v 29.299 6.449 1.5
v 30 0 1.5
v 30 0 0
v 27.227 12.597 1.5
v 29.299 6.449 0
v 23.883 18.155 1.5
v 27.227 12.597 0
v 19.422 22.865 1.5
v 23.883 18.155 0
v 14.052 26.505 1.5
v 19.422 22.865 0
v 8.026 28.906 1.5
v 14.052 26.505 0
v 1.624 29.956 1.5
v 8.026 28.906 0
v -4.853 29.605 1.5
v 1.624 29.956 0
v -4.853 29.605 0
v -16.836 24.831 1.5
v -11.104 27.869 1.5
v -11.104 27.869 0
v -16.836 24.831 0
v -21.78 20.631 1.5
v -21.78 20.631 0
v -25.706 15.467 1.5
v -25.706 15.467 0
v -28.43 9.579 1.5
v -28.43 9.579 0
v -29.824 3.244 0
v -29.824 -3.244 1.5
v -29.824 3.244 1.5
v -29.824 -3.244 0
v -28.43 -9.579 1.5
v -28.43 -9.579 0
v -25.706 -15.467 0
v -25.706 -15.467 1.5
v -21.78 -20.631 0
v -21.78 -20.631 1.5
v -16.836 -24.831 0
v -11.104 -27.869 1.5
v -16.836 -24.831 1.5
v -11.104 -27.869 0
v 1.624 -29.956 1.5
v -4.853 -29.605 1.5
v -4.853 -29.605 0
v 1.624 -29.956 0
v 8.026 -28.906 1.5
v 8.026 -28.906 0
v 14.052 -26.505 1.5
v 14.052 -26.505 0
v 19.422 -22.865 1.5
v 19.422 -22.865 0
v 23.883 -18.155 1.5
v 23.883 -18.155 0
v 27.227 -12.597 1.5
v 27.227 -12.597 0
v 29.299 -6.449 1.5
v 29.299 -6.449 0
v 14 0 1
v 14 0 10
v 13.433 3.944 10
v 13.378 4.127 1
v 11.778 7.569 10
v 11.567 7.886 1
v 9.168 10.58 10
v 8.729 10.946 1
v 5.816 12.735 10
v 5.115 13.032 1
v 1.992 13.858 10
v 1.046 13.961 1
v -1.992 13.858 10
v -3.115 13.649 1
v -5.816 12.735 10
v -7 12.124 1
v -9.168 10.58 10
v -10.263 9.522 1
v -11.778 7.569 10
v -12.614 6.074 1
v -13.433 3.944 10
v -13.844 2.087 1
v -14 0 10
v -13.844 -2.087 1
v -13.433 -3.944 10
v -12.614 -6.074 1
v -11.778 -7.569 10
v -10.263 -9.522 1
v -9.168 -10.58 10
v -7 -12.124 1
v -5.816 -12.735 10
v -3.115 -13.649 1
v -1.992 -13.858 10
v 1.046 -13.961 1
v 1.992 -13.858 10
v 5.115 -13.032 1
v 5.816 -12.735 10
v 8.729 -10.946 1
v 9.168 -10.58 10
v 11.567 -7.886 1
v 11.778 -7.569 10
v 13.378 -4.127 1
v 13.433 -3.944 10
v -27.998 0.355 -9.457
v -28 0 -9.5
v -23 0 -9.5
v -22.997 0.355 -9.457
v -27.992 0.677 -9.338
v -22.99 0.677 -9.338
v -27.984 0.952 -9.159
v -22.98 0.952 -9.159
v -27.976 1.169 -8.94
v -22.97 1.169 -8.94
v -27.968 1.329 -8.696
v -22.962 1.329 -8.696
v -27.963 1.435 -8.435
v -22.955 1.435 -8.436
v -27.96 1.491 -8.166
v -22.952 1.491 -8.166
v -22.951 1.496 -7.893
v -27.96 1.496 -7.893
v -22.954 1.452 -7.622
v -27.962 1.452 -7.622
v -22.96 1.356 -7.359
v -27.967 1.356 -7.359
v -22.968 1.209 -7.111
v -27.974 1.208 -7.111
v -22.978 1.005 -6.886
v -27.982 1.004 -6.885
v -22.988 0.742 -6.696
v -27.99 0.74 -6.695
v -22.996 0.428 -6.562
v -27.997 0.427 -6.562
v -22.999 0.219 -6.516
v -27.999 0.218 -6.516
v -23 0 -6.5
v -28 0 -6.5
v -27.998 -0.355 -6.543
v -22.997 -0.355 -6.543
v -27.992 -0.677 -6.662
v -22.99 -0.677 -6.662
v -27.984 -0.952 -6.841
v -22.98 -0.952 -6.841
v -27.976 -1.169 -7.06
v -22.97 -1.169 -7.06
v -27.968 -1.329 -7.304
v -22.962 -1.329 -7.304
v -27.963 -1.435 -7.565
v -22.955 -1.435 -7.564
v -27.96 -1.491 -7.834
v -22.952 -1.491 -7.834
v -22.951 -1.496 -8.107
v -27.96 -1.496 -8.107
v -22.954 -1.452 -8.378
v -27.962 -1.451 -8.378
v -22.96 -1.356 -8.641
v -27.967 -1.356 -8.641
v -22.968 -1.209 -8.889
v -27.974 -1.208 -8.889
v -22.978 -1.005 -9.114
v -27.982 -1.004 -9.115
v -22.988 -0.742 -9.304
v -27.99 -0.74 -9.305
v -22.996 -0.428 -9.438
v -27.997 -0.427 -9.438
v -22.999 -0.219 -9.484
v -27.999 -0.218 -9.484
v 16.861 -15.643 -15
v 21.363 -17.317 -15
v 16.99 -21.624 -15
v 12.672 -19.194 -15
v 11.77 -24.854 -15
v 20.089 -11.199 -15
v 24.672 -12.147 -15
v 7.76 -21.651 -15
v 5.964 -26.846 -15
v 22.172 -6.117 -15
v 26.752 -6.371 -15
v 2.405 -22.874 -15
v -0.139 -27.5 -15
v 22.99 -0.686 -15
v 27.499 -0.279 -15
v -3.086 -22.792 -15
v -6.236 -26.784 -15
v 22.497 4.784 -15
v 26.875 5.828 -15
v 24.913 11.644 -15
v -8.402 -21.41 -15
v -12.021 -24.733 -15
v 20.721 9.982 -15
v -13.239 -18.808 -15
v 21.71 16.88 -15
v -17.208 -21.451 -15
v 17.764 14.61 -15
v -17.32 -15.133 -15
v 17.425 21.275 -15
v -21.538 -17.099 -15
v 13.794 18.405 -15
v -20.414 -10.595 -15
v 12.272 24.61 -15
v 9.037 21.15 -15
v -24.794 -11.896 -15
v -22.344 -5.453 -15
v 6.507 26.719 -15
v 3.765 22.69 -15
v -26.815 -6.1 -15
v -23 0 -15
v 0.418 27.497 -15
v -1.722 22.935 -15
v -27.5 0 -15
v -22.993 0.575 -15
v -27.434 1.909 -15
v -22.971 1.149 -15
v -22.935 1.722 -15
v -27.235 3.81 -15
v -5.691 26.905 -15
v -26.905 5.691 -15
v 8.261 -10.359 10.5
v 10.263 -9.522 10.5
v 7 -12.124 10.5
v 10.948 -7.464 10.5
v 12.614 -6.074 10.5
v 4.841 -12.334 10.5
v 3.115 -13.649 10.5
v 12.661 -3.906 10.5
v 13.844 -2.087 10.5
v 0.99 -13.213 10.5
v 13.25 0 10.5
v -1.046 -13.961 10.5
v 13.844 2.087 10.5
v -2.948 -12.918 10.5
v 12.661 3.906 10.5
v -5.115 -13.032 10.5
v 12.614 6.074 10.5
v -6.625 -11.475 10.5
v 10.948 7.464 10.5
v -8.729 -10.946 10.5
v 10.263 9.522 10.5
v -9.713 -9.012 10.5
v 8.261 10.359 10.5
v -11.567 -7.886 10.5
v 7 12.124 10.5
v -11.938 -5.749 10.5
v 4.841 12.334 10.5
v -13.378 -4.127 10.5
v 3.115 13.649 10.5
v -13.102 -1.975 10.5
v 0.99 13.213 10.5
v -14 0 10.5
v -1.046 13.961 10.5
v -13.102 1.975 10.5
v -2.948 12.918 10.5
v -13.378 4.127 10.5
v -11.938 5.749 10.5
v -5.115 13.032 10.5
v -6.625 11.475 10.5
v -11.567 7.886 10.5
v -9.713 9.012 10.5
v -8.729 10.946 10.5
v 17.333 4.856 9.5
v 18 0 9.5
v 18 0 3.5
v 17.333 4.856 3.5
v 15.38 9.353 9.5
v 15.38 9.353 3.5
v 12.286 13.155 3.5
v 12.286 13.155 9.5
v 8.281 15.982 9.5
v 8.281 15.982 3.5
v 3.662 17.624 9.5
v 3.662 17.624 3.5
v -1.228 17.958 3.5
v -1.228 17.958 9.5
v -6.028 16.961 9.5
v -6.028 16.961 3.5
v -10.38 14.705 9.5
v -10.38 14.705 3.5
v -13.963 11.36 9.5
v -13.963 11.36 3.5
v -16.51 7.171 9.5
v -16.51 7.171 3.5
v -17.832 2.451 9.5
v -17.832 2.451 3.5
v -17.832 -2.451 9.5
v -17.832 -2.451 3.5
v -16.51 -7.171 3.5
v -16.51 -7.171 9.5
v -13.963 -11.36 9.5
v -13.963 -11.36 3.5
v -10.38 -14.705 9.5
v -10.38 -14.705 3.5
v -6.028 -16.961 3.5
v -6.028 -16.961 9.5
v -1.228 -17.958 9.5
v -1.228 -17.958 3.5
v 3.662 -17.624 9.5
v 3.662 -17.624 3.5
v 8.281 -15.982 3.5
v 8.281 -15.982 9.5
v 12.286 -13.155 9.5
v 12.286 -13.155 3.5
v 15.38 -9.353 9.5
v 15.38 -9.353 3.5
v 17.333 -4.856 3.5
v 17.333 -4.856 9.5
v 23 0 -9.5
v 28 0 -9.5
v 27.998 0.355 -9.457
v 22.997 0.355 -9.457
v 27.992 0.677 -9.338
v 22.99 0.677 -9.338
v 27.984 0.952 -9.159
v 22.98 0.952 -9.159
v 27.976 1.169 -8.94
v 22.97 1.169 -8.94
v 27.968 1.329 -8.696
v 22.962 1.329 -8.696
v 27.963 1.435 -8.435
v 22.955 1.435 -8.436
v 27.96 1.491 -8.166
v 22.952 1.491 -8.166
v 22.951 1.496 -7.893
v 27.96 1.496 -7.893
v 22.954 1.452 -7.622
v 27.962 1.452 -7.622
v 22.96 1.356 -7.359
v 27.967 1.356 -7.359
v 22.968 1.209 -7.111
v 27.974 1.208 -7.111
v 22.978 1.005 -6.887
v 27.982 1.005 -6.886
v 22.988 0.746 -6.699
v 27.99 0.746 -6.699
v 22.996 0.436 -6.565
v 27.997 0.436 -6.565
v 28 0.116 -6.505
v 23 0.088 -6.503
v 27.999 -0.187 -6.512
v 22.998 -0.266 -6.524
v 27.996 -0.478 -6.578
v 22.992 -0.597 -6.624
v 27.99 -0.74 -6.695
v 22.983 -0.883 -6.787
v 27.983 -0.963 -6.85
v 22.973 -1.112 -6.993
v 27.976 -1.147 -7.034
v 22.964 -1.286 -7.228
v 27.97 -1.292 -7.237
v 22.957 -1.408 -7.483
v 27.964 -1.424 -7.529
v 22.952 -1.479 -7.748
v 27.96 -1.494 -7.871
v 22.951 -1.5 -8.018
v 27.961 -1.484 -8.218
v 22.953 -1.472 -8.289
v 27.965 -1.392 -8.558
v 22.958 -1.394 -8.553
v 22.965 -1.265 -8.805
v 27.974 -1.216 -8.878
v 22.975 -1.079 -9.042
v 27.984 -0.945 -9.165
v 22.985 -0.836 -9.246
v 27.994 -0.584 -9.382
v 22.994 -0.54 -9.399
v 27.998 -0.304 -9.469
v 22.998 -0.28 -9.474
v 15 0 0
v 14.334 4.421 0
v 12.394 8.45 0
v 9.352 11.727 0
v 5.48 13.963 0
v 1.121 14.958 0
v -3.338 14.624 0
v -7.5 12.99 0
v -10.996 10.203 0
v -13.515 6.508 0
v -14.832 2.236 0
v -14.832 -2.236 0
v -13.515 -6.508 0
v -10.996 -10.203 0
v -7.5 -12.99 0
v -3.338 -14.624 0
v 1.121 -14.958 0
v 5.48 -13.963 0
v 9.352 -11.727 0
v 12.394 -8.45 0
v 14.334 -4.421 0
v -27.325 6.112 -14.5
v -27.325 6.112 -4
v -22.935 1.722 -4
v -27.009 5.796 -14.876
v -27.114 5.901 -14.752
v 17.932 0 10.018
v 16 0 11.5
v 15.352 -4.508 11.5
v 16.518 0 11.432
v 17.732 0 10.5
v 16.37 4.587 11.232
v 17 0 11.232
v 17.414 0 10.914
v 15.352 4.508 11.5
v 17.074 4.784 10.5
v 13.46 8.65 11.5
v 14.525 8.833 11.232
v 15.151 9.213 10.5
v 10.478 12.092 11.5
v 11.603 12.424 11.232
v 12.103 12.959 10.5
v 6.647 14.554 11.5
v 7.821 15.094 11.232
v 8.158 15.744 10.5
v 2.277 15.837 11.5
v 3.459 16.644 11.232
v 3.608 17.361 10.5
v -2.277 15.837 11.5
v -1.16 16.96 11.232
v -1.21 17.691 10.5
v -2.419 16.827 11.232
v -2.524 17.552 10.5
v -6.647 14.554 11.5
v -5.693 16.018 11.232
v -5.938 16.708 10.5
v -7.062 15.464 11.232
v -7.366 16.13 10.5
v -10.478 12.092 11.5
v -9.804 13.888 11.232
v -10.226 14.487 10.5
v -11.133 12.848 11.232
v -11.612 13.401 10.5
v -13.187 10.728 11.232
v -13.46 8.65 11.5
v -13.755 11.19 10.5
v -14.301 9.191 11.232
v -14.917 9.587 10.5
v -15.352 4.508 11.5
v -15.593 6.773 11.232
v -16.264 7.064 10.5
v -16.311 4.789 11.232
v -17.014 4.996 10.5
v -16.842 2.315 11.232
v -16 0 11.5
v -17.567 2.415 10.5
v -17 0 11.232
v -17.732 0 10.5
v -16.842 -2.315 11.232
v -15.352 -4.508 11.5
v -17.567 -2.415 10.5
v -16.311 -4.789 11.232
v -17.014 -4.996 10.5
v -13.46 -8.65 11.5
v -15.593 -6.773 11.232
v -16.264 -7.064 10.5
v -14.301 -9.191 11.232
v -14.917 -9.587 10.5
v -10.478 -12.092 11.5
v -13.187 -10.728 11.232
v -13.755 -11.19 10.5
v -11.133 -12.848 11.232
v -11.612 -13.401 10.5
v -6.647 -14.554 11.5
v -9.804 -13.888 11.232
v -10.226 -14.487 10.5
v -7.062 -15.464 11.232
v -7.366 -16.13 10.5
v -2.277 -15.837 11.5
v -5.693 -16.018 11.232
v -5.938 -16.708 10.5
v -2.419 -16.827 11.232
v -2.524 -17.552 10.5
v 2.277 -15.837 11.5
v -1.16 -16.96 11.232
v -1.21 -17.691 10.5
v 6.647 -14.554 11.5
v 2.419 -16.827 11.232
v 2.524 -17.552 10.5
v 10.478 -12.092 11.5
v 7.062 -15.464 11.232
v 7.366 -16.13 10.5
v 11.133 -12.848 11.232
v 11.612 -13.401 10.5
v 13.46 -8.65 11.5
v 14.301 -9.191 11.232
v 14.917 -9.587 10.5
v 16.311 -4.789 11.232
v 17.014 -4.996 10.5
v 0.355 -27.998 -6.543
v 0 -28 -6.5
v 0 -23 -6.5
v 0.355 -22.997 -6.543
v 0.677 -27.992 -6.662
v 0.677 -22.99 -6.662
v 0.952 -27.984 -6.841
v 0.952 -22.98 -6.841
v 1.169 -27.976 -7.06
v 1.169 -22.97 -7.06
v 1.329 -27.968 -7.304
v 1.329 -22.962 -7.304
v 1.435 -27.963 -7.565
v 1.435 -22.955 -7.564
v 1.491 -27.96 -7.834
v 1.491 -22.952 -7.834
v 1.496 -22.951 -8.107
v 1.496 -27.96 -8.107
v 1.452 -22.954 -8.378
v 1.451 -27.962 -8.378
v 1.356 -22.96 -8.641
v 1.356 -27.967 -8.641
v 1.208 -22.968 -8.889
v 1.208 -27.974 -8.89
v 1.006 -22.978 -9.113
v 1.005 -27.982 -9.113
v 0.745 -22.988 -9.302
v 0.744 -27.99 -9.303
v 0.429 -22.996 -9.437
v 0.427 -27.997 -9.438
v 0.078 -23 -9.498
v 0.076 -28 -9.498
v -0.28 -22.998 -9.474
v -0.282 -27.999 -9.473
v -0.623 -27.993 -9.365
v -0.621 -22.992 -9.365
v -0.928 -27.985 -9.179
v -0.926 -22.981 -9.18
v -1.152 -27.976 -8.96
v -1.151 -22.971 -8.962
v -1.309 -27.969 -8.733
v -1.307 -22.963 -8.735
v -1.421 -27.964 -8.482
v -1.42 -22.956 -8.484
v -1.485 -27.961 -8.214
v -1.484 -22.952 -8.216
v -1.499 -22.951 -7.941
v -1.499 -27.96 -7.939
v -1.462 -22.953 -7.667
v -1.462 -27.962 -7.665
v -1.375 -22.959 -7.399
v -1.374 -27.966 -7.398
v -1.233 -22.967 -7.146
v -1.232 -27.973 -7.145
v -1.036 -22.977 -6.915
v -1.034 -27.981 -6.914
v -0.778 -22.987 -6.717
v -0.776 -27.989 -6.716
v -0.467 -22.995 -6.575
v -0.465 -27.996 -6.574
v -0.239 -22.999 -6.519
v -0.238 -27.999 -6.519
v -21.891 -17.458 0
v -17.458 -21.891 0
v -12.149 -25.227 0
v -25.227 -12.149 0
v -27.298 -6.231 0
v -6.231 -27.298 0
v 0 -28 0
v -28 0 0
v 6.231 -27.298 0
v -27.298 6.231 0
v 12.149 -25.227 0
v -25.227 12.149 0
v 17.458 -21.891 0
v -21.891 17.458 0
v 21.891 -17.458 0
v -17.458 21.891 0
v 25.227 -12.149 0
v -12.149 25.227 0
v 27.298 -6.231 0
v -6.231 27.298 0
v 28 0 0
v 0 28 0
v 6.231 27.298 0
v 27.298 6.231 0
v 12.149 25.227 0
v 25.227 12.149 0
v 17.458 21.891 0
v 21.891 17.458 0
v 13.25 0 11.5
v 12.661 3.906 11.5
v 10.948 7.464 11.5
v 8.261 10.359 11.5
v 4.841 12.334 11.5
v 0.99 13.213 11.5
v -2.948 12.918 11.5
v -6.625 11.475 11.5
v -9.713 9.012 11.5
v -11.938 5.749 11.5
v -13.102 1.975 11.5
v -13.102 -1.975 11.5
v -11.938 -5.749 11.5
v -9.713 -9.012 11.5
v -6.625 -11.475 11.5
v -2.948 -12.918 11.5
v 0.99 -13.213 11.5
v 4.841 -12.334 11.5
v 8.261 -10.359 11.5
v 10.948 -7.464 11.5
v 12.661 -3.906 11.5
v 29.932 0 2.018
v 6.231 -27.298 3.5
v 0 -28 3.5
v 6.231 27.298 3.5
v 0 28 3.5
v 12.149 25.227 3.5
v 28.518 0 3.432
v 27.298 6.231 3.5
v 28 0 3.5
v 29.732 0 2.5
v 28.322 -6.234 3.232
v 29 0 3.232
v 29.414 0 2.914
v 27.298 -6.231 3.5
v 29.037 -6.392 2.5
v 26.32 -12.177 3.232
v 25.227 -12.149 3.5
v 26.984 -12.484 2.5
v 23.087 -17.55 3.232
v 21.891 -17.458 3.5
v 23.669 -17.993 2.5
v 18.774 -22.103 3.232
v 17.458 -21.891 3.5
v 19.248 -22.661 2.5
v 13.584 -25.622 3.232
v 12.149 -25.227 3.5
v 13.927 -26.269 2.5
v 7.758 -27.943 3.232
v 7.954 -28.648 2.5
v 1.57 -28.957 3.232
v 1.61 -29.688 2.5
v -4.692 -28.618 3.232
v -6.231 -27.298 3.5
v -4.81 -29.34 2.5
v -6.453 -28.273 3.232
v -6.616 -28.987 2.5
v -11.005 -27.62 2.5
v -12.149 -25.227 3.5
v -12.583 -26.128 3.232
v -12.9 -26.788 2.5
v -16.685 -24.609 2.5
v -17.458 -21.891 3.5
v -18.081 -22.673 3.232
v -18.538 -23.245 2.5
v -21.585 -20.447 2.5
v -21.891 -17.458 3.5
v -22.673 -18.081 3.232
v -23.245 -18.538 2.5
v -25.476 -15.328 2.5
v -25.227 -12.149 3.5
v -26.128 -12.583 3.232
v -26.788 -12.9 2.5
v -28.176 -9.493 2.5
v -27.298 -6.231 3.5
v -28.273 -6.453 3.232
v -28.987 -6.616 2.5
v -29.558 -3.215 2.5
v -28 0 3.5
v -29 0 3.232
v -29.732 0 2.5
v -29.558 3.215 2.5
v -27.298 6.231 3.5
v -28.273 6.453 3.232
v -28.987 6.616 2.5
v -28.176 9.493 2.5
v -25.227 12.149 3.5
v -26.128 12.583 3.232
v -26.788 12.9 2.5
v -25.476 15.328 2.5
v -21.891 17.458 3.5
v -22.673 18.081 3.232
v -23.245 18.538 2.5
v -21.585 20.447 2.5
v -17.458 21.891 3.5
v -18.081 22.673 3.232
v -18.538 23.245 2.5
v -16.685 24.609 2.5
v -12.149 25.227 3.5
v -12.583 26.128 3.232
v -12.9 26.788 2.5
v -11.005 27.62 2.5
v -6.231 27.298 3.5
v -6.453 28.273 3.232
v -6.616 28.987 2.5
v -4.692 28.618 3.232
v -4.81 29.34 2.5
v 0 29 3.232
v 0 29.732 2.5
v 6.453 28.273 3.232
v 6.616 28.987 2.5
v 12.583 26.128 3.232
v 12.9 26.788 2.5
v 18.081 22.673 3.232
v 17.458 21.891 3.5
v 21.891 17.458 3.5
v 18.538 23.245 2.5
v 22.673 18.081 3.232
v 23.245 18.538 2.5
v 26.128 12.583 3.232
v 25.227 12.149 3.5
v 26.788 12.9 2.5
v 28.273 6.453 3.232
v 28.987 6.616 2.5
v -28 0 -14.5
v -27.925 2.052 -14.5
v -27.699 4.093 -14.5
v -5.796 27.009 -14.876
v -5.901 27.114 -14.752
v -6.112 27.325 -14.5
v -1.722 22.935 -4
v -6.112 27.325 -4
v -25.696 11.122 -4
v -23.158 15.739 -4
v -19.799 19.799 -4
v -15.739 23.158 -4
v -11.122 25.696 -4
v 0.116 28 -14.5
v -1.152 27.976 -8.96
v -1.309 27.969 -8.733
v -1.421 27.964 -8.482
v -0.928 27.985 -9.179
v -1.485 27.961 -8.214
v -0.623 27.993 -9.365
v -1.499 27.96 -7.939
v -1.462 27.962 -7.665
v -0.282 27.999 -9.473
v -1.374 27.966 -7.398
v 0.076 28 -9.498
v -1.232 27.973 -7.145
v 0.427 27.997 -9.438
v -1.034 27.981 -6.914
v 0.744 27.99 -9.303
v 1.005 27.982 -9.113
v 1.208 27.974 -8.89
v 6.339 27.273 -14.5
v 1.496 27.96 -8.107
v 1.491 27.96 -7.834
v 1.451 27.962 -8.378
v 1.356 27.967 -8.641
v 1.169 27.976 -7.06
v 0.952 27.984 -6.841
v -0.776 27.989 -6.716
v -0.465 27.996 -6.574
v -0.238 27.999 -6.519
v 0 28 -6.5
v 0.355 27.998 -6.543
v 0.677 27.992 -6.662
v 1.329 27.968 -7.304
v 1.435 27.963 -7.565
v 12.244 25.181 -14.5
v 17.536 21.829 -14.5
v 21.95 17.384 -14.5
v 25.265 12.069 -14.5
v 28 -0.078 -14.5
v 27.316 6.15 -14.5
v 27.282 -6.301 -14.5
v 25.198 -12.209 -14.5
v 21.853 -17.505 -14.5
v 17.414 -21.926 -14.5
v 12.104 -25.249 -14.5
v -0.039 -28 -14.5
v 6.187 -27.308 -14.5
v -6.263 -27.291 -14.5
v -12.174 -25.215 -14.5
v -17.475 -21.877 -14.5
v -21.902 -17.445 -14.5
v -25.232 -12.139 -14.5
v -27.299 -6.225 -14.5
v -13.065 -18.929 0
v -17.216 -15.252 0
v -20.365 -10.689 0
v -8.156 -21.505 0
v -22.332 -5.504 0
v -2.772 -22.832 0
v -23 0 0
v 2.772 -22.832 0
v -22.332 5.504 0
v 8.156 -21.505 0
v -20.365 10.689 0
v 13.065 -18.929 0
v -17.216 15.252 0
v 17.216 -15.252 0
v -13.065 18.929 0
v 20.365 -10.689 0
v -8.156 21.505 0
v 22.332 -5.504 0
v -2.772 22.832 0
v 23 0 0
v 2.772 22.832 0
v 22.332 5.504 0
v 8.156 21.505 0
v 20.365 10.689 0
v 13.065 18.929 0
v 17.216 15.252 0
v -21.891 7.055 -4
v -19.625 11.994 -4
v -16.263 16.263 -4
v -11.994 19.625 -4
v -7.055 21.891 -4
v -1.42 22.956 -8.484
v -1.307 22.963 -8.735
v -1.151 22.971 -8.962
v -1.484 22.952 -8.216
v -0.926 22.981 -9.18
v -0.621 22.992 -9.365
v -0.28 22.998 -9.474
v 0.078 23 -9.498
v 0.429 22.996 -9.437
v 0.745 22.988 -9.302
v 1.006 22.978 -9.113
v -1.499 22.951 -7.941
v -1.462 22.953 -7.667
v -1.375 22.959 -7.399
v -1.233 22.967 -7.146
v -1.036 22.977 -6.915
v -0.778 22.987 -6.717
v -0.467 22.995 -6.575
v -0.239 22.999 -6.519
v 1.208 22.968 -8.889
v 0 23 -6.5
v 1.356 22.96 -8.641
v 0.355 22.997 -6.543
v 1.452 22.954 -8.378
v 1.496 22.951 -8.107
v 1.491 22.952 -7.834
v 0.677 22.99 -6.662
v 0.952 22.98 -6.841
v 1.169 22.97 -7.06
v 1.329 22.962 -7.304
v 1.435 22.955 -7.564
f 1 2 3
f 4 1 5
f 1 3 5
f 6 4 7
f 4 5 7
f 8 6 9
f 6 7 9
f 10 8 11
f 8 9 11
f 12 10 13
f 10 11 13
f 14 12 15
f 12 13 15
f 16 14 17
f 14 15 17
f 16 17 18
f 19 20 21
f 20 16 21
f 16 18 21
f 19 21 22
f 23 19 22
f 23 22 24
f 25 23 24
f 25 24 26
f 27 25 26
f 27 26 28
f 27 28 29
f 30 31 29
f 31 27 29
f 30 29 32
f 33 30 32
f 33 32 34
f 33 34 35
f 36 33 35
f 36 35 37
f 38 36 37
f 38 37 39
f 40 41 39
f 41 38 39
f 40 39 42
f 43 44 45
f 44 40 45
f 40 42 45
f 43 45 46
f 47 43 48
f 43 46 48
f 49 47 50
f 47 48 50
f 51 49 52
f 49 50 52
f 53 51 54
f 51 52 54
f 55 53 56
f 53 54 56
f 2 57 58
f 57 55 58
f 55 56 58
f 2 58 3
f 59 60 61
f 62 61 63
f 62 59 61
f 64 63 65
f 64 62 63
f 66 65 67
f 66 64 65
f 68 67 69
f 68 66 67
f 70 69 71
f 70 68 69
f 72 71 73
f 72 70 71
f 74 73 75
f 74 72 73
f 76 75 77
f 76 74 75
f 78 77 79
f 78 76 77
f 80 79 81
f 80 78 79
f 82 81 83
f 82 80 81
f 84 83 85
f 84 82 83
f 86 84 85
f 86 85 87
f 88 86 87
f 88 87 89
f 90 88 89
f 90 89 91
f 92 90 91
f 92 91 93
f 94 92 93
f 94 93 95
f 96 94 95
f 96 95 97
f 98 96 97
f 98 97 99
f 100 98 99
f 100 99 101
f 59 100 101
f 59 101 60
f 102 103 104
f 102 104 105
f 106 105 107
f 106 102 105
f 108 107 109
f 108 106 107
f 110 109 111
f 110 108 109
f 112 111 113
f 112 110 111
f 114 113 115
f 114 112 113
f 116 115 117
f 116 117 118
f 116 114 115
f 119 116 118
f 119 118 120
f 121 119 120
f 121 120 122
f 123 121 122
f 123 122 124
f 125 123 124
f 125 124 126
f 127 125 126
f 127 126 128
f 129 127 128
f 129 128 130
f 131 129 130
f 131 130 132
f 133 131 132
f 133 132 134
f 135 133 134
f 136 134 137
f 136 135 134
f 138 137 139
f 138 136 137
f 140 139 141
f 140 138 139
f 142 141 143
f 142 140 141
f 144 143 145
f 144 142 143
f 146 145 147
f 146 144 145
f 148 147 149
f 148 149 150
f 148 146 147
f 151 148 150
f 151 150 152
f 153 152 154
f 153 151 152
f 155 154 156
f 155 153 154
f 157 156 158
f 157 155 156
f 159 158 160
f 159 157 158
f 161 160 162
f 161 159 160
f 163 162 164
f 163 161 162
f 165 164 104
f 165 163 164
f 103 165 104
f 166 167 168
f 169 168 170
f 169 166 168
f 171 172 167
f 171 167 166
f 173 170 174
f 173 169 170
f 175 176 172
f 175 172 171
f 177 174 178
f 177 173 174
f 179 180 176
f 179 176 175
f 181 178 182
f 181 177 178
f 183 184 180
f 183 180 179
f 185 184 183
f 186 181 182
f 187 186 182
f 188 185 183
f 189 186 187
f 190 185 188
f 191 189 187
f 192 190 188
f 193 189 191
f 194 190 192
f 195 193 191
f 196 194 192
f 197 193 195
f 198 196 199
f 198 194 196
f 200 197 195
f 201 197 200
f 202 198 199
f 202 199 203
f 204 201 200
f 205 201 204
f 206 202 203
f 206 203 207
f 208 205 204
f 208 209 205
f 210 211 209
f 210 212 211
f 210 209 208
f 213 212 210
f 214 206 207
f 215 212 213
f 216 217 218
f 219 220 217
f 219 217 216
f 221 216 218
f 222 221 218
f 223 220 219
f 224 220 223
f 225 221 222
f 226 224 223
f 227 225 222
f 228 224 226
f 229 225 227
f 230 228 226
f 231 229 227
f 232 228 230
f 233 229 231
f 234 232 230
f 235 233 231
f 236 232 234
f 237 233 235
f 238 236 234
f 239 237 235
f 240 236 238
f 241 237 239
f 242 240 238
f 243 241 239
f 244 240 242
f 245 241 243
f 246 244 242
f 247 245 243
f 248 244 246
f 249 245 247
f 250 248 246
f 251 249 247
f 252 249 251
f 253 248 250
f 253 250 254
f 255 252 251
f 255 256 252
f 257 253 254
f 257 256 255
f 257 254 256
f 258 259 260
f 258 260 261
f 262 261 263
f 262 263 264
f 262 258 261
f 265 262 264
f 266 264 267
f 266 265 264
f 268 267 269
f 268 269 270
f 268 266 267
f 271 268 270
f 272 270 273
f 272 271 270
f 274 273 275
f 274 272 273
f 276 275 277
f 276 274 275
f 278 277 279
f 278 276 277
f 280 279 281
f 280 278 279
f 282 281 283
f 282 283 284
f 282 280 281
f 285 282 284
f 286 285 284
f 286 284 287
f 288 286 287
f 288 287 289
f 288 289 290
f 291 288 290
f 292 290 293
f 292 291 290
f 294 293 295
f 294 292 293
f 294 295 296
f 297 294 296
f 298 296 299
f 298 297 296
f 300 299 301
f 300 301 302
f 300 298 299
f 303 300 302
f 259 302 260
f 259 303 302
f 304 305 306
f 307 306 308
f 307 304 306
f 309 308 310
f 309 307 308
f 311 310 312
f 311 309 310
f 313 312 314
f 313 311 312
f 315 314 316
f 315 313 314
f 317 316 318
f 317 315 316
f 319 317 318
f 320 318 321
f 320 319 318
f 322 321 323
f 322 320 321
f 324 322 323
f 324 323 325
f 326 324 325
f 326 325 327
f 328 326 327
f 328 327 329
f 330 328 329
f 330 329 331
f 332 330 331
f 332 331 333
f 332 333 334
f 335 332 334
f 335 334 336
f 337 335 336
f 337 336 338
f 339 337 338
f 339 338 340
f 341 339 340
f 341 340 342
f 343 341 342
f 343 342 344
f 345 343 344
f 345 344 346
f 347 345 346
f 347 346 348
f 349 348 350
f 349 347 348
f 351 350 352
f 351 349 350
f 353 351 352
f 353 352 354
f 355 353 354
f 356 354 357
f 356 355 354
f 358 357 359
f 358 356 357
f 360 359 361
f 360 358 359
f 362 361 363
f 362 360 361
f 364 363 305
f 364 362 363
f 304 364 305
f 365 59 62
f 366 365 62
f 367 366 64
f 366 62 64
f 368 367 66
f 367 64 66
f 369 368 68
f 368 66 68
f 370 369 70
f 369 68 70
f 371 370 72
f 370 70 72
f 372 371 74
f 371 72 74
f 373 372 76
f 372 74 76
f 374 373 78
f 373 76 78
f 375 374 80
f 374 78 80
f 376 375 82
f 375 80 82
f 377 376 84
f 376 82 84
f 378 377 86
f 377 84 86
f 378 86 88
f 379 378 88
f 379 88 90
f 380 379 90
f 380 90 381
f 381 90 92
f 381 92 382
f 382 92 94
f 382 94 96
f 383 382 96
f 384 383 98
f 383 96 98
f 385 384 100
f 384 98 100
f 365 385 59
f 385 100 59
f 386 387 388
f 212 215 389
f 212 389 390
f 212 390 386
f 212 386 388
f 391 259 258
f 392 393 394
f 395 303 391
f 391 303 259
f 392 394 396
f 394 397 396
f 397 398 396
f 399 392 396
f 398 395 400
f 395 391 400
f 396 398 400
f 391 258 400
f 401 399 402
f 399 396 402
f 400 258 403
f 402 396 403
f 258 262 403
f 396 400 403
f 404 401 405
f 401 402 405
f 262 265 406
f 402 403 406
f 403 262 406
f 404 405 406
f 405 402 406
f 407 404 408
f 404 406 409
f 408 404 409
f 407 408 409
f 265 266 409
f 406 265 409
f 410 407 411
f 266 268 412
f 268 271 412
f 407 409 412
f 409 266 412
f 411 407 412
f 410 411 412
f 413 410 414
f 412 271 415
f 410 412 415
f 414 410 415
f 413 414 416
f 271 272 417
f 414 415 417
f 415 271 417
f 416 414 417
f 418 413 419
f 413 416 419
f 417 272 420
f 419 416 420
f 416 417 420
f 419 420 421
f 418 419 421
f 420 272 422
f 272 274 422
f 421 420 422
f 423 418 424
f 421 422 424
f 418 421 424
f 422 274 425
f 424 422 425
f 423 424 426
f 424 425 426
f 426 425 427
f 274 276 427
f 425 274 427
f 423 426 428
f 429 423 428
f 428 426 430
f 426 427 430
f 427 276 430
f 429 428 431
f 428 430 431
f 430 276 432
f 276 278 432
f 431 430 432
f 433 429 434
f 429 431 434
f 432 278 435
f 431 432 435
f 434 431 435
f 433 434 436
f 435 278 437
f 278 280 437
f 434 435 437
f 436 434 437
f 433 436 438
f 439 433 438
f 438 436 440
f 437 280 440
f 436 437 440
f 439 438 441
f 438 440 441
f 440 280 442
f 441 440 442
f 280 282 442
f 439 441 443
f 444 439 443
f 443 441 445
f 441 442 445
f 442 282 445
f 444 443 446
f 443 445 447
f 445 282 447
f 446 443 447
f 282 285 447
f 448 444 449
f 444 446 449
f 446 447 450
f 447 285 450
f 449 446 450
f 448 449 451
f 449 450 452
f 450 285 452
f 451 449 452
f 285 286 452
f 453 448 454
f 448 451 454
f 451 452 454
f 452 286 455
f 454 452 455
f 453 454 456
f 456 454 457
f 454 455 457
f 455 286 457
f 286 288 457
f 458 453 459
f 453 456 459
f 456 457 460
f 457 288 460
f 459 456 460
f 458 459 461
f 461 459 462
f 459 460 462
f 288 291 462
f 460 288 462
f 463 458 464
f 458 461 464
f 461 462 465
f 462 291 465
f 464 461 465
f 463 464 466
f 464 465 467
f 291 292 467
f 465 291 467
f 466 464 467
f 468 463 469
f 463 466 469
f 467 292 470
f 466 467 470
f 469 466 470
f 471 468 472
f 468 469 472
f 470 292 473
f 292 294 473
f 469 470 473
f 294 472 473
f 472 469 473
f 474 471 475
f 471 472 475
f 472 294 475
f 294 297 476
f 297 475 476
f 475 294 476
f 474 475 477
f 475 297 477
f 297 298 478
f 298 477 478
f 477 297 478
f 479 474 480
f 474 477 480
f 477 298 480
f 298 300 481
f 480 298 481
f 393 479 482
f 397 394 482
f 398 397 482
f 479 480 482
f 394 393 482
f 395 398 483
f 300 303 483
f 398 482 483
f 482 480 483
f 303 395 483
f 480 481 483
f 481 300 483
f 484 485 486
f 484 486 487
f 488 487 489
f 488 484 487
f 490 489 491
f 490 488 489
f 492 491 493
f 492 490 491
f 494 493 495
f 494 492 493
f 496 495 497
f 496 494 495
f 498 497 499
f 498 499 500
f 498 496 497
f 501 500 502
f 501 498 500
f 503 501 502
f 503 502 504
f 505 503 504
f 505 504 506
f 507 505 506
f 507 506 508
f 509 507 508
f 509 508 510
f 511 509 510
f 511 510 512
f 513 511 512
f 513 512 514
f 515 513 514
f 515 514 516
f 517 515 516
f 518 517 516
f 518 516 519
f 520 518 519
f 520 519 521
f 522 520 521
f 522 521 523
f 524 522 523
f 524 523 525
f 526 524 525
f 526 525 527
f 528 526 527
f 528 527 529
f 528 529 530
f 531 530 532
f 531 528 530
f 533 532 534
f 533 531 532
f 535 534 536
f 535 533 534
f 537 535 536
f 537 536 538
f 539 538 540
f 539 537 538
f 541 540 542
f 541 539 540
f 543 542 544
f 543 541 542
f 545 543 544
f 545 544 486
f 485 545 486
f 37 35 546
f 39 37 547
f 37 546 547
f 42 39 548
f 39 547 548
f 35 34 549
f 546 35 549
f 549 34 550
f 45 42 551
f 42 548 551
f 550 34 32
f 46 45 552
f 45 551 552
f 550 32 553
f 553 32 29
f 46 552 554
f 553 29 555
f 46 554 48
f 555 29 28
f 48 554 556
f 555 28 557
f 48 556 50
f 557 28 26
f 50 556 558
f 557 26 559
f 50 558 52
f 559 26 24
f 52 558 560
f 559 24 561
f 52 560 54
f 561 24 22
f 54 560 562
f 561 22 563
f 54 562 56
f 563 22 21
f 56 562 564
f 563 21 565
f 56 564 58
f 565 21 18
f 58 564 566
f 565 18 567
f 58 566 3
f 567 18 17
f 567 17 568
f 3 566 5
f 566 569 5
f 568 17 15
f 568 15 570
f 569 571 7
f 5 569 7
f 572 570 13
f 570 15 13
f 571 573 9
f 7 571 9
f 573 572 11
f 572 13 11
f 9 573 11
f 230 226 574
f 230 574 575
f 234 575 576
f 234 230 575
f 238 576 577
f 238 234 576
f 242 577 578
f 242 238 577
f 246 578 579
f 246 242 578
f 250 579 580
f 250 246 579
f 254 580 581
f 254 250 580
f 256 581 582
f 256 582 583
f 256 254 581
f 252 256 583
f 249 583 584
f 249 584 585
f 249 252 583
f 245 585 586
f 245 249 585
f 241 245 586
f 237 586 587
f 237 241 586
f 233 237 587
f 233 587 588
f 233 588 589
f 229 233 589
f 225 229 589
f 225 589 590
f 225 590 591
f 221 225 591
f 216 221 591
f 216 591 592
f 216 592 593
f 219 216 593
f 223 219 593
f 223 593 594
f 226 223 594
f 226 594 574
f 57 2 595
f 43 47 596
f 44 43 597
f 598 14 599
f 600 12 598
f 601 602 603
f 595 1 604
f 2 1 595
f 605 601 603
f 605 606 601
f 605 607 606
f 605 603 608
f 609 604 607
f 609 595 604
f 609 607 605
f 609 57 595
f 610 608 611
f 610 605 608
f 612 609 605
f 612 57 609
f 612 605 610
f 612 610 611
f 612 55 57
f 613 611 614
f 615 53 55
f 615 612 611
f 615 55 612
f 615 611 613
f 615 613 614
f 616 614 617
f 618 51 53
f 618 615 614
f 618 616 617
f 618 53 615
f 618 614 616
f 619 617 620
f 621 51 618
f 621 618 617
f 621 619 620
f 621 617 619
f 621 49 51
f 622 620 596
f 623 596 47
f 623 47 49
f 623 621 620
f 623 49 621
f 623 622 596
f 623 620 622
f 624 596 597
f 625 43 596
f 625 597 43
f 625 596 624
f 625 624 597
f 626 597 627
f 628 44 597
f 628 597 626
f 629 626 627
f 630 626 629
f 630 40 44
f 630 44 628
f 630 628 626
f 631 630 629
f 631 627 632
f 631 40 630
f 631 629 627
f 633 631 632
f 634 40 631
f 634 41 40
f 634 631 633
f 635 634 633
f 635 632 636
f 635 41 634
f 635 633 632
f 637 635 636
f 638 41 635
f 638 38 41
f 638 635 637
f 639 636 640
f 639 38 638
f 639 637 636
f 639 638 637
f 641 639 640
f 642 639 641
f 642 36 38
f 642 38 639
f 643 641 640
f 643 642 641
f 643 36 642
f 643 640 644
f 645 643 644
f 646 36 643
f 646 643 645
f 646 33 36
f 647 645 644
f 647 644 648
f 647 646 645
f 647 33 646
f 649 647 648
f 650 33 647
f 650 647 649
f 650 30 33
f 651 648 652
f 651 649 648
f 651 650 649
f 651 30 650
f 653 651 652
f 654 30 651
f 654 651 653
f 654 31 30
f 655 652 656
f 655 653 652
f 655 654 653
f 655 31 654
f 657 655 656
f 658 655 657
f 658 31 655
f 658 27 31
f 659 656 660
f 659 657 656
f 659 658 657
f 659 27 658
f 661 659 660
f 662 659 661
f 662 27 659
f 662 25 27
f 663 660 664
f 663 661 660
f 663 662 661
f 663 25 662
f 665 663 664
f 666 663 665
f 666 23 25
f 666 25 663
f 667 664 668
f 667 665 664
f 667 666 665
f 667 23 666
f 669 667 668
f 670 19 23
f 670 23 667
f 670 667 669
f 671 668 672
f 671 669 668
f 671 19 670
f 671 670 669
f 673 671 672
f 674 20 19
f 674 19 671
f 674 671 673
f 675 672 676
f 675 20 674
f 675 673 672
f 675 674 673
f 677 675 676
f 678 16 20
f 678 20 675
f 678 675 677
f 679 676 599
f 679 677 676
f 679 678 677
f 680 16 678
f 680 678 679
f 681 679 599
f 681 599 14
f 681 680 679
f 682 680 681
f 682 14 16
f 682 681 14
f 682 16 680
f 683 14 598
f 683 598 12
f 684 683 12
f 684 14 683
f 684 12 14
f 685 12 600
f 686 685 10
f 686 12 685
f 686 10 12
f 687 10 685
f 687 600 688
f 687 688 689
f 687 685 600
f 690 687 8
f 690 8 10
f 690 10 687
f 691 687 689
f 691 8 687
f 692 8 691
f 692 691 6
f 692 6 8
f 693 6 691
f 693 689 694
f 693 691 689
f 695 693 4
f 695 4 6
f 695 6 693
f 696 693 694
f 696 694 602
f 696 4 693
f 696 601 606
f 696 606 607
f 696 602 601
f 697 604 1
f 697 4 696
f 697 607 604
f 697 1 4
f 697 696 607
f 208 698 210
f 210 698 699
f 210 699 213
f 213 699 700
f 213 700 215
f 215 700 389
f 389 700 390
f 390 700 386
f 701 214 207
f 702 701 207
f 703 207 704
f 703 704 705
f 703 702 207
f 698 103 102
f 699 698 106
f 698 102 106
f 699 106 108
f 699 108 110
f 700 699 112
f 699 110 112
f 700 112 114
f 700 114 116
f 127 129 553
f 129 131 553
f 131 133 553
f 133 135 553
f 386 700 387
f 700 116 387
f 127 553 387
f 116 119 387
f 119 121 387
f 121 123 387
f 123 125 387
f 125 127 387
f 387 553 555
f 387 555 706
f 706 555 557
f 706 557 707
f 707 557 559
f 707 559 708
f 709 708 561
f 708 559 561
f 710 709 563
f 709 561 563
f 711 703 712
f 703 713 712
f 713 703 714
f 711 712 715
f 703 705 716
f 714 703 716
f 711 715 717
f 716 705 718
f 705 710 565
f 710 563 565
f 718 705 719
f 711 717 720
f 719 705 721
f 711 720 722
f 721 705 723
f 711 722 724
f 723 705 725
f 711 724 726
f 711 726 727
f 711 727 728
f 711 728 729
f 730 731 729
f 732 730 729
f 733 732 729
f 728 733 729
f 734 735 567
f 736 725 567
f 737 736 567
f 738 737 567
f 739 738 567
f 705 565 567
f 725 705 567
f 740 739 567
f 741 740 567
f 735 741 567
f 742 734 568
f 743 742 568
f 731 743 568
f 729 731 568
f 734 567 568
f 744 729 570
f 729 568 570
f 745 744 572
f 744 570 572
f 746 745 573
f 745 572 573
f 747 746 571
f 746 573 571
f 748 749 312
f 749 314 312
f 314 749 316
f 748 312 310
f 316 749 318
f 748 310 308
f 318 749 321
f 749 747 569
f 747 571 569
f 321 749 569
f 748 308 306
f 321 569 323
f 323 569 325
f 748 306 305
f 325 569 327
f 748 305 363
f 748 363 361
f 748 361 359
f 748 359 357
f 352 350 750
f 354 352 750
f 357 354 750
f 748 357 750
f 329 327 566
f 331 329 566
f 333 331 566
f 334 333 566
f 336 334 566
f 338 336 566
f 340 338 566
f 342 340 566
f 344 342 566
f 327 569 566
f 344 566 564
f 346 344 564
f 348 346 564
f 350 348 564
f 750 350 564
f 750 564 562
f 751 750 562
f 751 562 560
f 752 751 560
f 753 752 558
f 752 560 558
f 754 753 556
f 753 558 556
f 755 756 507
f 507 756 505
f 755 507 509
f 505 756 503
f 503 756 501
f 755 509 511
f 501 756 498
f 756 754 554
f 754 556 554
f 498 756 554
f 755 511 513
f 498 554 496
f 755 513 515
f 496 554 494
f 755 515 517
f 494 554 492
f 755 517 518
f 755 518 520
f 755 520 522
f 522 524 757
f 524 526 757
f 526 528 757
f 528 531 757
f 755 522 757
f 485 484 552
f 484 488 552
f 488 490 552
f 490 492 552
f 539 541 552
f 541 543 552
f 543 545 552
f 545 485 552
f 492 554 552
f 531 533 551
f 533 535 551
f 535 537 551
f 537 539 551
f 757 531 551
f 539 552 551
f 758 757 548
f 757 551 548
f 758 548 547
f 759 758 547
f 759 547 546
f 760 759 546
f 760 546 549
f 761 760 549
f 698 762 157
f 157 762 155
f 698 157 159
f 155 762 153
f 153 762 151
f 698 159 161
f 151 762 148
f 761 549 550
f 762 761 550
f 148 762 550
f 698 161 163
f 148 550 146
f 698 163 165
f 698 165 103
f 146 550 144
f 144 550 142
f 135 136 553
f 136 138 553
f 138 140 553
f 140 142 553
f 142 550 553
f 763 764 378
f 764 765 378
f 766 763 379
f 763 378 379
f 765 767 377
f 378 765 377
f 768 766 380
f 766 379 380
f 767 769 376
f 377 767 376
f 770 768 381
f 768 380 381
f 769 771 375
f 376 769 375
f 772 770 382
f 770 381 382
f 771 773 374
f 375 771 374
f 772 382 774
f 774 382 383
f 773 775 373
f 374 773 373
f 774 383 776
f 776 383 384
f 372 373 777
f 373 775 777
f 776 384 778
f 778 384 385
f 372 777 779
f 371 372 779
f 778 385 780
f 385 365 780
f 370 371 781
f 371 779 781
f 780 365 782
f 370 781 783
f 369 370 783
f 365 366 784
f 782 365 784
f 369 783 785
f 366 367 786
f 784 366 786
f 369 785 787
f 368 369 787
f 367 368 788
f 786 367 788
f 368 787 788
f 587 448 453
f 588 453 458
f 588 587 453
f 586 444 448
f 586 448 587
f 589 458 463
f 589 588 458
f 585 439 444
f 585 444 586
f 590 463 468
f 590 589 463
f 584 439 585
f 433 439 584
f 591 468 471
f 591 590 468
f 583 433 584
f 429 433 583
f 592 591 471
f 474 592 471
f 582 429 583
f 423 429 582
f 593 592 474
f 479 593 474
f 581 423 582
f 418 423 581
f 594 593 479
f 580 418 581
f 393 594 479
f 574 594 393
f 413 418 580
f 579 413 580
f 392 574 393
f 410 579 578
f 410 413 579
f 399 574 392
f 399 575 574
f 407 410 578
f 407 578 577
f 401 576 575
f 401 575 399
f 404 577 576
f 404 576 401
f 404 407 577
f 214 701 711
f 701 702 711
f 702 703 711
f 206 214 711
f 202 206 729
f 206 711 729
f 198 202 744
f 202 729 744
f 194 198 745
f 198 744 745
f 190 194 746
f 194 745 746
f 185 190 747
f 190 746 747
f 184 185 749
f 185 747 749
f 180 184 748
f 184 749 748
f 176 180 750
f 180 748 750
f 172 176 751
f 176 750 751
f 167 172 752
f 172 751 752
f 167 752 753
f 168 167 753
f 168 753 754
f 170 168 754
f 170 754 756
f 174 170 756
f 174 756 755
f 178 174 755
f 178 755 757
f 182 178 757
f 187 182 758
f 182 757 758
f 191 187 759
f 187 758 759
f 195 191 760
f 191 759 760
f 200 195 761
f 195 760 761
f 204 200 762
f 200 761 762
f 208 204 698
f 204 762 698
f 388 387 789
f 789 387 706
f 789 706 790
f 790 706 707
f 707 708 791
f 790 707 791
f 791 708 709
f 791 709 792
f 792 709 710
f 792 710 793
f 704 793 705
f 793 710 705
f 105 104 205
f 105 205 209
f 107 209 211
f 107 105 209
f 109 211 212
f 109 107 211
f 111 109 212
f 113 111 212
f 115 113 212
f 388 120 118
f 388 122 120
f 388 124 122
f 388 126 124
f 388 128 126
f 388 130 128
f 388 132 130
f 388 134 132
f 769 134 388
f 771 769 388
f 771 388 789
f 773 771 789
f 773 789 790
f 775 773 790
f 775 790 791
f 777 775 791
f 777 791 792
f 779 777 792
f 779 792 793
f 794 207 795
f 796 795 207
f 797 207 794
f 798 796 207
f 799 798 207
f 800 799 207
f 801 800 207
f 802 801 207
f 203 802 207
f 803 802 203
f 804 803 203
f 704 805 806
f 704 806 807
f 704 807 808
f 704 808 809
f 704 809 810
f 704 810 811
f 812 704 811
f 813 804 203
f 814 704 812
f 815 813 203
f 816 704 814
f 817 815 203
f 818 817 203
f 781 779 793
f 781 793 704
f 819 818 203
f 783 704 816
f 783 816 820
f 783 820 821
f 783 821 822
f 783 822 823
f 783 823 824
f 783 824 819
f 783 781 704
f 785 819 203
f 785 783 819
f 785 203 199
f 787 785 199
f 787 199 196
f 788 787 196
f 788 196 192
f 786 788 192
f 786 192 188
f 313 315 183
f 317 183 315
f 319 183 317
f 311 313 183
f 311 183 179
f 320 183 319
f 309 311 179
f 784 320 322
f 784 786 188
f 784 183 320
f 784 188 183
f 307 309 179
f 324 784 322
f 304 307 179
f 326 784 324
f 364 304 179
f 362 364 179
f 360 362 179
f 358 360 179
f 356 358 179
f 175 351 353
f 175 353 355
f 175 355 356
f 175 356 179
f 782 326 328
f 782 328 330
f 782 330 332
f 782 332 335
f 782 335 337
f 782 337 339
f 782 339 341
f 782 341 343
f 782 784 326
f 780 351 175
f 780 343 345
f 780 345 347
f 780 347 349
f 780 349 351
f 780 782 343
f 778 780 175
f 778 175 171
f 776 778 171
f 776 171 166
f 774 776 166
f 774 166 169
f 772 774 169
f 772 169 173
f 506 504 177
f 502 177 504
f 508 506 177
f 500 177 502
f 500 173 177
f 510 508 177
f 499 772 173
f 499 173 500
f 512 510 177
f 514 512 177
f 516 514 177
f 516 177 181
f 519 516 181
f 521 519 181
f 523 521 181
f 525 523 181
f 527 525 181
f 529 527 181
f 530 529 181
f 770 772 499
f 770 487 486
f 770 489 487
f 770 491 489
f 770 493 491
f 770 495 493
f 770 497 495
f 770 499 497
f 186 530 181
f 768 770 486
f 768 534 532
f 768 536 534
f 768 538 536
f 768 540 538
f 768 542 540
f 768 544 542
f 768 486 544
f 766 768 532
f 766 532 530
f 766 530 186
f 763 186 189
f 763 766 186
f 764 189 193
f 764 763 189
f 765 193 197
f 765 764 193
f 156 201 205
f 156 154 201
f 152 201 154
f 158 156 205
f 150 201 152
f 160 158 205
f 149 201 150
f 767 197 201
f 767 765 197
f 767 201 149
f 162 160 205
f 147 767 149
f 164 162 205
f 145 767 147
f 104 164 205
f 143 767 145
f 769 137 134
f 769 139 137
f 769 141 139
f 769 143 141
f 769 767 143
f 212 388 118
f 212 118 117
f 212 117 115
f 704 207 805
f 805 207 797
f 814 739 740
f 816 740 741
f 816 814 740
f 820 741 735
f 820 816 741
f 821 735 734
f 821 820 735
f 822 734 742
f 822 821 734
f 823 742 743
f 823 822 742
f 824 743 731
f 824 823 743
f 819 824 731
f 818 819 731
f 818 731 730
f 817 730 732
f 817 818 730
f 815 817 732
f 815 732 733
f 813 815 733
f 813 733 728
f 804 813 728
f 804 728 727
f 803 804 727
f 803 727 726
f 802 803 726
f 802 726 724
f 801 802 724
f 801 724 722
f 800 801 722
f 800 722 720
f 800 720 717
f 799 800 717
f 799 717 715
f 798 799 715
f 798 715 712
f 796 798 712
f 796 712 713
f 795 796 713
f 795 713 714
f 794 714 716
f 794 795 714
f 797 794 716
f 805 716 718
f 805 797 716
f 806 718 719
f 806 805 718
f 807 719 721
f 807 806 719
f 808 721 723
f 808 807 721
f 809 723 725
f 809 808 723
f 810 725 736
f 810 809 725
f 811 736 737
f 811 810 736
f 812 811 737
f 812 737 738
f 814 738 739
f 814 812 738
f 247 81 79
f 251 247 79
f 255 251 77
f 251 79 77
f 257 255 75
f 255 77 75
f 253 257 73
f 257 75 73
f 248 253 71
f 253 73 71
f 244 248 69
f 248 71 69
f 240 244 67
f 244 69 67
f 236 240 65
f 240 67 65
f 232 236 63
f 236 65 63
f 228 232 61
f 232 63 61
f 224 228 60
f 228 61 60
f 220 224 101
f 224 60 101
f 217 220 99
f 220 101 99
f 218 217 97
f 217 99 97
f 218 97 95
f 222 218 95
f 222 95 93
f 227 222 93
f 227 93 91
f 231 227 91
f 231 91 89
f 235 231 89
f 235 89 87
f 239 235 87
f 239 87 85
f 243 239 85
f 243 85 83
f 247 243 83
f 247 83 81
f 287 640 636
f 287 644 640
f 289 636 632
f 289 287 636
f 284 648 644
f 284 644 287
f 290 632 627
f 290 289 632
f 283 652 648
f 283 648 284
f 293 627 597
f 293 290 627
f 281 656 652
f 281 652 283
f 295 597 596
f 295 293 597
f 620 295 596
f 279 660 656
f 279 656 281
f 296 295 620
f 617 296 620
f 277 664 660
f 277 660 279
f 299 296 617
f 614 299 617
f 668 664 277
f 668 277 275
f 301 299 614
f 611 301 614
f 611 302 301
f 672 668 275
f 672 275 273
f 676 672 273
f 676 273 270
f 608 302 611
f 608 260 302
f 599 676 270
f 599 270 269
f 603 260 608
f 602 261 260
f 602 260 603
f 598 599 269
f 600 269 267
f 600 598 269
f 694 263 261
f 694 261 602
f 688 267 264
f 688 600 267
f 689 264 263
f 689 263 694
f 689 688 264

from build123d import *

# Parameters (mm, degrees)
SKETCH_2_R               = 30
SKETCH_2_R_2             = 14
EXTRUDE_1_DEPTH          = 11.5
EXTRUDE_START            = -1.5
SKETCH_3_R               = 14
SKETCH_3_R_2             = 13.25
EXTRUDE_2_DEPTH          = 1.5
SKETCH_4_R               = 33.760613234
SKETCH_4_R_2             = 18
CUT_EXTRUDE_1_DEPTH      = 8
FILLET_1_R               = 2
FILLET_2_R               = 2
SKETCH_6_R               = 28
SKETCH_6_R_2             = 23
EXTRUDE_3_DEPTH          = 15
CUT_EXTRUDE_2_DEPTH      = 46
CUT_EXTRUDE_2_DEPTH_BACK = 46
SKETCH_7_R               = 1.5
CUT_EXTRUDE_3_DEPTH      = 46.000000033
CUT_EXTRUDE_3_DEPTH_BACK = 46.000000033
SKETCH_8_R               = 1.5
CUT_EXTRUDE_4_DEPTH      = 11
SKETCH_15_R              = 14
CUT_EXTRUDE_5_DEPTH      = 0.5
CHAMFER_1_SIZE           = 1
CHAMFER_2_SIZE           = 0.5


with BuildPart() as part:
    # 스케치2 → 보스-돌출1 (new body)
    with BuildSketch(Plane.XY):
        Circle(SKETCH_2_R)
        Circle(SKETCH_2_R_2, mode=Mode.SUBTRACT)
    extrude(amount=EXTRUDE_1_DEPTH)

    # 스케치3 → 보스-돌출2 (add)
    with BuildSketch(Plane.XY.offset(11.5).offset(EXTRUDE_START)):
        Circle(SKETCH_3_R)
        Circle(SKETCH_3_R_2, mode=Mode.SUBTRACT)
    extrude(amount=EXTRUDE_2_DEPTH)

    # 스케치4 → 컷-돌출1 (cut)
    with BuildSketch(Plane.XY.offset(11.5)):
        Circle(SKETCH_4_R)
        Circle(SKETCH_4_R_2, mode=Mode.SUBTRACT)
    extrude(amount=-CUT_EXTRUDE_1_DEPTH, mode=Mode.SUBTRACT)

    # 필렛1
    fillet_1_edges = [part.edges().sort_by_distance(p)[0] for p in [
        (-18, 0, 11.5),
    ]]
    fillet(fillet_1_edges, radius=FILLET_1_R)

    # 필렛2
    fillet_2_edges = [part.edges().sort_by_distance(p)[0] for p in [
        (-30, 0, 3.5),
    ]]
    fillet(fillet_2_edges, radius=FILLET_2_R)

    # 스케치6 → 보스-돌출3 (add)
    with BuildSketch(Plane(origin=(0, 0, 0), x_dir=(-1, 0, 0), z_dir=(0, 0, -1))):
        Circle(SKETCH_6_R)
        Circle(SKETCH_6_R_2, mode=Mode.SUBTRACT)
    extrude(amount=EXTRUDE_3_DEPTH)

    # 스케치7 → 컷-돌출2 (cut, two sides: drawn at the far end of the back side and taken through both)
    with BuildSketch(Plane(origin=(0, 0, 0), x_dir=(1, 0, 0), z_dir=(0, 1, 0)).offset(-CUT_EXTRUDE_2_DEPTH_BACK)):
        with Locations(Location((0, 8, 0), (0, 0, 270))):
            Circle(SKETCH_7_R)
    extrude(amount=CUT_EXTRUDE_2_DEPTH + CUT_EXTRUDE_2_DEPTH_BACK, mode=Mode.SUBTRACT)

    # 스케치8 → 컷-돌출3 (cut, two sides: drawn at the far end of the back side and taken through both)
    with BuildSketch(Plane(origin=(0, 0, 0), x_dir=(0, 0, -1), z_dir=(1, 0, 0)).offset(-CUT_EXTRUDE_3_DEPTH_BACK)):
        with Locations((8, 0)):
            Circle(SKETCH_8_R)
    extrude(amount=CUT_EXTRUDE_3_DEPTH + CUT_EXTRUDE_3_DEPTH_BACK, mode=Mode.SUBTRACT)

    # 스케치13 → 컷-돌출4 (cut)
    with BuildSketch(Plane(origin=(0, 0, -15), x_dir=(-1, 0, 0), z_dir=(0, 0, -1))):
        Polygon((19.798989873, 19.798989873), (30.405591591, 9.192388155), (19.798989873, -1.414213562), (9.192388155, 9.192388155), (-1.414213562, 19.798989873), (9.192388155, 30.405591591), align=None)
    extrude(amount=-CUT_EXTRUDE_4_DEPTH, mode=Mode.SUBTRACT)

    # 스케치15 → 컷-돌출5 (cut)
    with BuildSketch(Plane(origin=(0, 0, 10), x_dir=(-1, 0, 0), z_dir=(0, 0, -1))):
        Circle(SKETCH_15_R)
    extrude(amount=-CUT_EXTRUDE_5_DEPTH, mode=Mode.SUBTRACT)

    # 모따기1
    chamfer_1_edges = [part.edges().sort_by_distance(p)[0] for p in [
        (-14, 0, 0),
    ]]
    chamfer(chamfer_1_edges, length=CHAMFER_1_SIZE)

    # 모따기2
    chamfer_2_edges = [part.edges().sort_by_distance(p)[0] for p in [
        (21.853217724, -17.505338474, -15),
    ]]
    chamfer(chamfer_2_edges, length=CHAMFER_2_SIZE)


solid = part.part
